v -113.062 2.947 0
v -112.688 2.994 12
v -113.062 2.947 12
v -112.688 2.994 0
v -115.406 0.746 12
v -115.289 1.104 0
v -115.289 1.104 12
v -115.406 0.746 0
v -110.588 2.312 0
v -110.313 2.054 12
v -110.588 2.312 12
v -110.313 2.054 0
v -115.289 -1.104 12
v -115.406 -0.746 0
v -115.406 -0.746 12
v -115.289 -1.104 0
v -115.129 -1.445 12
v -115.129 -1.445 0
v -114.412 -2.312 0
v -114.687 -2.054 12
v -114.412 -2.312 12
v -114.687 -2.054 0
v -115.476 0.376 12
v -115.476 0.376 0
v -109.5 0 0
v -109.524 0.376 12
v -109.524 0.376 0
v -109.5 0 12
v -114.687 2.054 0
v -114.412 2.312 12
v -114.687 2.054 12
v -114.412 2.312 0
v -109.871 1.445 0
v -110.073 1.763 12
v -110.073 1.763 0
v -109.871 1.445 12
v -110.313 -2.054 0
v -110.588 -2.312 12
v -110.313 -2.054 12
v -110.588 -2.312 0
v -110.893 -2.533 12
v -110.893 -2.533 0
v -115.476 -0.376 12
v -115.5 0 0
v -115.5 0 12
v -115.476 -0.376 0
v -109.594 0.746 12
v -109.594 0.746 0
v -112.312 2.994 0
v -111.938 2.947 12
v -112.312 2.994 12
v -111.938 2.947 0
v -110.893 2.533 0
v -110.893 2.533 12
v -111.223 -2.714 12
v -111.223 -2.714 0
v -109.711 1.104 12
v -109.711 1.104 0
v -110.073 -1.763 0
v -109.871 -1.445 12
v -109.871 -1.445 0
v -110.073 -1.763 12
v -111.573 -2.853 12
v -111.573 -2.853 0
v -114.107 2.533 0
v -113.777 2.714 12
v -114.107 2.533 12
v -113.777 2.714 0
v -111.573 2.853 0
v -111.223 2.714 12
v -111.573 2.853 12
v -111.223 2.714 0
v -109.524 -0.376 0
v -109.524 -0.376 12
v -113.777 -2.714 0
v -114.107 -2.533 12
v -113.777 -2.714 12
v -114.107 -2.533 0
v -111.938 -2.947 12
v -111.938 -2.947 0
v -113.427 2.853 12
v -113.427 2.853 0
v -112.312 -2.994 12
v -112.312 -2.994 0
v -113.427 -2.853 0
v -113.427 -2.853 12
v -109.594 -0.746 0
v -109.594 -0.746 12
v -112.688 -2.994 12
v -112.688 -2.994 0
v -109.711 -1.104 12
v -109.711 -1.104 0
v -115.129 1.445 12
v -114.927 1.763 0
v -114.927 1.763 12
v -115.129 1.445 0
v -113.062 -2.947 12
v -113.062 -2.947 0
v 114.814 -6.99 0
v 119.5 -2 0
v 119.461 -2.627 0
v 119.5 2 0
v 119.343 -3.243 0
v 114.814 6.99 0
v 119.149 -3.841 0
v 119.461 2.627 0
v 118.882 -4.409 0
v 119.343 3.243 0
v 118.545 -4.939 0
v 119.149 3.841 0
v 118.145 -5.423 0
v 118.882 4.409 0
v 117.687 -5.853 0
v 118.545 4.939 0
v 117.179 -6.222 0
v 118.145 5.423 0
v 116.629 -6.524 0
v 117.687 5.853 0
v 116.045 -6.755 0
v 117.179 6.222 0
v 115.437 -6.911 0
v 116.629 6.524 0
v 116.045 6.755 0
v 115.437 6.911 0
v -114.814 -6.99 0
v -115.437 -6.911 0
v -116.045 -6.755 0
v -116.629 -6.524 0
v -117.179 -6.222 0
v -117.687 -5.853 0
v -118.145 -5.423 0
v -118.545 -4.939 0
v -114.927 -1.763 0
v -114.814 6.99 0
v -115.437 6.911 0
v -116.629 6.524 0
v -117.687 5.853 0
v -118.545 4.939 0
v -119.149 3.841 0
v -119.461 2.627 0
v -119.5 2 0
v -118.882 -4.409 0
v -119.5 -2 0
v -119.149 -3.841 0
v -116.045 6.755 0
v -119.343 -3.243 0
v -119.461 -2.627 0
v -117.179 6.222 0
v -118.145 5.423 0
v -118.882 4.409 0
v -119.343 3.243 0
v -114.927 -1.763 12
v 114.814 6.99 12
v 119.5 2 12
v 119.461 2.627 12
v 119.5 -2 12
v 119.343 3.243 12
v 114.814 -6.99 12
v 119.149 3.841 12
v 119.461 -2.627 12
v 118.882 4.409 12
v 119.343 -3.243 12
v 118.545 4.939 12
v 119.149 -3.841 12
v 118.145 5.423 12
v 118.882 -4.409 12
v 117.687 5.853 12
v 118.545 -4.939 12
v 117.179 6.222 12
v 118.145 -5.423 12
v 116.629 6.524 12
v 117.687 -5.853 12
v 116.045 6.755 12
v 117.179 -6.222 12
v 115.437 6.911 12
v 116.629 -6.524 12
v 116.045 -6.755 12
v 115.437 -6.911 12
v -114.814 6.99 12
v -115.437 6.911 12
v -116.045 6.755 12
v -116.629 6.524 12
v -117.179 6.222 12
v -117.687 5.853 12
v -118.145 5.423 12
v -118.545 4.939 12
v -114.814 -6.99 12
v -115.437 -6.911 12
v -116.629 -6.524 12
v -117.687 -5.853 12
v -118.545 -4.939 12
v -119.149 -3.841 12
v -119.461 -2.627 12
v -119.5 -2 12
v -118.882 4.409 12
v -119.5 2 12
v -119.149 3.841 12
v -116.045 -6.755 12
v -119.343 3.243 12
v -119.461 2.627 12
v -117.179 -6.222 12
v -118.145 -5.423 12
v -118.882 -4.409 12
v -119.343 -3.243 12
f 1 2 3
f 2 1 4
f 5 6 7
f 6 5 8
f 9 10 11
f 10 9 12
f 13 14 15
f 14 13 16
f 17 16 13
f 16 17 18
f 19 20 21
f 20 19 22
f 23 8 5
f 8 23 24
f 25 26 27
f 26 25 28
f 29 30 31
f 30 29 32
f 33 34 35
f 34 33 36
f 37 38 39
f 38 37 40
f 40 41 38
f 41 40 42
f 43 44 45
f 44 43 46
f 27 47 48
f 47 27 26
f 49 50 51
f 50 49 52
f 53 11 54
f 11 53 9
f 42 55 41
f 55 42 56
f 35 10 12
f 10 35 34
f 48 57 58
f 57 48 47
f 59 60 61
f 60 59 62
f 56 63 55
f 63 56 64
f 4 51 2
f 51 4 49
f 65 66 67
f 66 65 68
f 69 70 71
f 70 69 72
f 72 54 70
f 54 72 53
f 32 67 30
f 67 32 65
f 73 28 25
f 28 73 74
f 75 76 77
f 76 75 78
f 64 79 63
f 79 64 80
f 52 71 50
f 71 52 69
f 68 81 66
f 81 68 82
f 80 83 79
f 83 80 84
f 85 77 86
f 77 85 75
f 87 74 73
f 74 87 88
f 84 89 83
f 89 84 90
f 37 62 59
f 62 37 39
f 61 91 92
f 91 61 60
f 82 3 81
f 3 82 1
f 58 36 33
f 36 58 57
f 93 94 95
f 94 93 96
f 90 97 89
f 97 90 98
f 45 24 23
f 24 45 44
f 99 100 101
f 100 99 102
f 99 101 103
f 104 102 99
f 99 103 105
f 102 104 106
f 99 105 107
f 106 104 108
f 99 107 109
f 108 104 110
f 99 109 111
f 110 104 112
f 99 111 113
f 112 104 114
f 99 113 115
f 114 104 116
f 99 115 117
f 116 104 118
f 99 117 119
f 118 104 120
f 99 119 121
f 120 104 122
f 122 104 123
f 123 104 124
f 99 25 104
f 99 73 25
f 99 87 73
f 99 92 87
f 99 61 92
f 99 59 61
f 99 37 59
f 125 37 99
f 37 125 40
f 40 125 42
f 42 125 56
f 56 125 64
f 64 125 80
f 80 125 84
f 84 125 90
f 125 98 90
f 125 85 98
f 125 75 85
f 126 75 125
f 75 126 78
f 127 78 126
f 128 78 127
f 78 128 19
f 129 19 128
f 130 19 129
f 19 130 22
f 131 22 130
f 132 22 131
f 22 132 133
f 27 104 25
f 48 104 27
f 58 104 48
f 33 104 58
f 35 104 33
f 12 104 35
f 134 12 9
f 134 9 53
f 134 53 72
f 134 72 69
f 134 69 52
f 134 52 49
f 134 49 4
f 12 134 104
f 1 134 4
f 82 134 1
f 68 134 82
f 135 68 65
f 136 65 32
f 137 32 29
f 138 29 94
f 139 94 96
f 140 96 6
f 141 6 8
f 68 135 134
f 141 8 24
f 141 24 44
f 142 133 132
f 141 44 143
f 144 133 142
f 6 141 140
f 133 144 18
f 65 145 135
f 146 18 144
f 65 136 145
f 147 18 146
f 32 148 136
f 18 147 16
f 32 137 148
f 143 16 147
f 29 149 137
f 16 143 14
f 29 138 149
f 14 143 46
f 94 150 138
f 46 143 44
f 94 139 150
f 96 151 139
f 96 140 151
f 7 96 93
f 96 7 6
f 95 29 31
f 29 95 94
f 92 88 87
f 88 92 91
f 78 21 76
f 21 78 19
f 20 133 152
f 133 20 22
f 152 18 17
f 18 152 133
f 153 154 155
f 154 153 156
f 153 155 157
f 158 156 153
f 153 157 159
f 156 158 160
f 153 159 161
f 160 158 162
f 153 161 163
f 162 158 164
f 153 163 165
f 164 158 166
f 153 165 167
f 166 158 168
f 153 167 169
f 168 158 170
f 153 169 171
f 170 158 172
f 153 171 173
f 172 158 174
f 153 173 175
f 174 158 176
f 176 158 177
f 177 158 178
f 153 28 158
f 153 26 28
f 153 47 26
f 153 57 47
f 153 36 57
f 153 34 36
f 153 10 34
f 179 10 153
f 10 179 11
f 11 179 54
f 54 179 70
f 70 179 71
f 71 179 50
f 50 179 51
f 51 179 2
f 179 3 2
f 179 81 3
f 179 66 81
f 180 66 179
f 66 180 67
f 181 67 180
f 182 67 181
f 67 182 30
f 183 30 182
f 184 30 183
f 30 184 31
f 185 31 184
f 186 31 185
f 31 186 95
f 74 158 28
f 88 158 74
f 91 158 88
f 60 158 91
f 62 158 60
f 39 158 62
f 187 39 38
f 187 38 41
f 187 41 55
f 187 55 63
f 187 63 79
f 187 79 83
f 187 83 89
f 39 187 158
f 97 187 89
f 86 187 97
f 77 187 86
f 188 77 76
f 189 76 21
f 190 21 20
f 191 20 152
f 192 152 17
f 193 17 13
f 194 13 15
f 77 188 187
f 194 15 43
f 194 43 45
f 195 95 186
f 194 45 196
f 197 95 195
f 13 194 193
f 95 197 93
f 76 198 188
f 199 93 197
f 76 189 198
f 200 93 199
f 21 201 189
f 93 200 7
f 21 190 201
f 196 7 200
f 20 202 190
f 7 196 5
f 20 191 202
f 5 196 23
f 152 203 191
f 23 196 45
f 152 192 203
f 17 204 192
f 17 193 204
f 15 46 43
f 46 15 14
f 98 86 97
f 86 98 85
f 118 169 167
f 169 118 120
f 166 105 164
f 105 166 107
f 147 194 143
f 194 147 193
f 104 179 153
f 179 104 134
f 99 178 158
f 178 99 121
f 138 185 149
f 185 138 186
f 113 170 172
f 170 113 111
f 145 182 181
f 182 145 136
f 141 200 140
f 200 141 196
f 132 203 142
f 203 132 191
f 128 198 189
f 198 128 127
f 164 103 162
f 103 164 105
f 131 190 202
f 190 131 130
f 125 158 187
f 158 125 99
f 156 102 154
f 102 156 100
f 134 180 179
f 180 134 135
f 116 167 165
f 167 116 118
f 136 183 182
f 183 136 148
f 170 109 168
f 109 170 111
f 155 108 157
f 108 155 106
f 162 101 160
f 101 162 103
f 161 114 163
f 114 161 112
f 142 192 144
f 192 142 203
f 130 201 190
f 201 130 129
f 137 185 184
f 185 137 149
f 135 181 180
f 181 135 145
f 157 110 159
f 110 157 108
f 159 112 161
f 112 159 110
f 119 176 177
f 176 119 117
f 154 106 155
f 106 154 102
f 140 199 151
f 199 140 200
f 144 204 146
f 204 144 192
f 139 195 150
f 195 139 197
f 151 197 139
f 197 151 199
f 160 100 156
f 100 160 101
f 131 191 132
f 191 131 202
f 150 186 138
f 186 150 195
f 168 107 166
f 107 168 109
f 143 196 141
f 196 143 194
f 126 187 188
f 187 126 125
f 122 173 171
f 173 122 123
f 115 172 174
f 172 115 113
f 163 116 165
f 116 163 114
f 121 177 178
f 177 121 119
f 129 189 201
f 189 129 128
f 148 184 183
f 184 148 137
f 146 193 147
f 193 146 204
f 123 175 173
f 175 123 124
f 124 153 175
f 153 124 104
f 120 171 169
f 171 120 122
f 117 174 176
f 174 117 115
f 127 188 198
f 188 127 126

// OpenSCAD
$fn = 50;


difference() {
	union() {
		hull() {
			translate(v = [-114.5000000000, 2.0000000000, 0]) {
				cylinder(h = 12, r = 5);
			}
			translate(v = [114.5000000000, 2.0000000000, 0]) {
				cylinder(h = 12, r = 5);
			}
			translate(v = [-114.5000000000, -2.0000000000, 0]) {
				cylinder(h = 12, r = 5);
			}
			translate(v = [114.5000000000, -2.0000000000, 0]) {
				cylinder(h = 12, r = 5);
			}
		}
	}
	union() {
		translate(v = [-112.5000000000, 0.0000000000, 0]) {
			cylinder(h = 12, r = 3.0000000000);
		}
		translate(v = [-112.5000000000, 0.0000000000, 0]) {
			cylinder(h = 12, r = 1.5000000000);
		}
		translate(v = [-112.5000000000, 0.0000000000, 0]) {
			cylinder(h = 12, r = 1.5000000000);
		}
		translate(v = [-112.5000000000, 0.0000000000, 0]) {
			cylinder(h = 12, r = 1.5000000000);
		}
	}
}
